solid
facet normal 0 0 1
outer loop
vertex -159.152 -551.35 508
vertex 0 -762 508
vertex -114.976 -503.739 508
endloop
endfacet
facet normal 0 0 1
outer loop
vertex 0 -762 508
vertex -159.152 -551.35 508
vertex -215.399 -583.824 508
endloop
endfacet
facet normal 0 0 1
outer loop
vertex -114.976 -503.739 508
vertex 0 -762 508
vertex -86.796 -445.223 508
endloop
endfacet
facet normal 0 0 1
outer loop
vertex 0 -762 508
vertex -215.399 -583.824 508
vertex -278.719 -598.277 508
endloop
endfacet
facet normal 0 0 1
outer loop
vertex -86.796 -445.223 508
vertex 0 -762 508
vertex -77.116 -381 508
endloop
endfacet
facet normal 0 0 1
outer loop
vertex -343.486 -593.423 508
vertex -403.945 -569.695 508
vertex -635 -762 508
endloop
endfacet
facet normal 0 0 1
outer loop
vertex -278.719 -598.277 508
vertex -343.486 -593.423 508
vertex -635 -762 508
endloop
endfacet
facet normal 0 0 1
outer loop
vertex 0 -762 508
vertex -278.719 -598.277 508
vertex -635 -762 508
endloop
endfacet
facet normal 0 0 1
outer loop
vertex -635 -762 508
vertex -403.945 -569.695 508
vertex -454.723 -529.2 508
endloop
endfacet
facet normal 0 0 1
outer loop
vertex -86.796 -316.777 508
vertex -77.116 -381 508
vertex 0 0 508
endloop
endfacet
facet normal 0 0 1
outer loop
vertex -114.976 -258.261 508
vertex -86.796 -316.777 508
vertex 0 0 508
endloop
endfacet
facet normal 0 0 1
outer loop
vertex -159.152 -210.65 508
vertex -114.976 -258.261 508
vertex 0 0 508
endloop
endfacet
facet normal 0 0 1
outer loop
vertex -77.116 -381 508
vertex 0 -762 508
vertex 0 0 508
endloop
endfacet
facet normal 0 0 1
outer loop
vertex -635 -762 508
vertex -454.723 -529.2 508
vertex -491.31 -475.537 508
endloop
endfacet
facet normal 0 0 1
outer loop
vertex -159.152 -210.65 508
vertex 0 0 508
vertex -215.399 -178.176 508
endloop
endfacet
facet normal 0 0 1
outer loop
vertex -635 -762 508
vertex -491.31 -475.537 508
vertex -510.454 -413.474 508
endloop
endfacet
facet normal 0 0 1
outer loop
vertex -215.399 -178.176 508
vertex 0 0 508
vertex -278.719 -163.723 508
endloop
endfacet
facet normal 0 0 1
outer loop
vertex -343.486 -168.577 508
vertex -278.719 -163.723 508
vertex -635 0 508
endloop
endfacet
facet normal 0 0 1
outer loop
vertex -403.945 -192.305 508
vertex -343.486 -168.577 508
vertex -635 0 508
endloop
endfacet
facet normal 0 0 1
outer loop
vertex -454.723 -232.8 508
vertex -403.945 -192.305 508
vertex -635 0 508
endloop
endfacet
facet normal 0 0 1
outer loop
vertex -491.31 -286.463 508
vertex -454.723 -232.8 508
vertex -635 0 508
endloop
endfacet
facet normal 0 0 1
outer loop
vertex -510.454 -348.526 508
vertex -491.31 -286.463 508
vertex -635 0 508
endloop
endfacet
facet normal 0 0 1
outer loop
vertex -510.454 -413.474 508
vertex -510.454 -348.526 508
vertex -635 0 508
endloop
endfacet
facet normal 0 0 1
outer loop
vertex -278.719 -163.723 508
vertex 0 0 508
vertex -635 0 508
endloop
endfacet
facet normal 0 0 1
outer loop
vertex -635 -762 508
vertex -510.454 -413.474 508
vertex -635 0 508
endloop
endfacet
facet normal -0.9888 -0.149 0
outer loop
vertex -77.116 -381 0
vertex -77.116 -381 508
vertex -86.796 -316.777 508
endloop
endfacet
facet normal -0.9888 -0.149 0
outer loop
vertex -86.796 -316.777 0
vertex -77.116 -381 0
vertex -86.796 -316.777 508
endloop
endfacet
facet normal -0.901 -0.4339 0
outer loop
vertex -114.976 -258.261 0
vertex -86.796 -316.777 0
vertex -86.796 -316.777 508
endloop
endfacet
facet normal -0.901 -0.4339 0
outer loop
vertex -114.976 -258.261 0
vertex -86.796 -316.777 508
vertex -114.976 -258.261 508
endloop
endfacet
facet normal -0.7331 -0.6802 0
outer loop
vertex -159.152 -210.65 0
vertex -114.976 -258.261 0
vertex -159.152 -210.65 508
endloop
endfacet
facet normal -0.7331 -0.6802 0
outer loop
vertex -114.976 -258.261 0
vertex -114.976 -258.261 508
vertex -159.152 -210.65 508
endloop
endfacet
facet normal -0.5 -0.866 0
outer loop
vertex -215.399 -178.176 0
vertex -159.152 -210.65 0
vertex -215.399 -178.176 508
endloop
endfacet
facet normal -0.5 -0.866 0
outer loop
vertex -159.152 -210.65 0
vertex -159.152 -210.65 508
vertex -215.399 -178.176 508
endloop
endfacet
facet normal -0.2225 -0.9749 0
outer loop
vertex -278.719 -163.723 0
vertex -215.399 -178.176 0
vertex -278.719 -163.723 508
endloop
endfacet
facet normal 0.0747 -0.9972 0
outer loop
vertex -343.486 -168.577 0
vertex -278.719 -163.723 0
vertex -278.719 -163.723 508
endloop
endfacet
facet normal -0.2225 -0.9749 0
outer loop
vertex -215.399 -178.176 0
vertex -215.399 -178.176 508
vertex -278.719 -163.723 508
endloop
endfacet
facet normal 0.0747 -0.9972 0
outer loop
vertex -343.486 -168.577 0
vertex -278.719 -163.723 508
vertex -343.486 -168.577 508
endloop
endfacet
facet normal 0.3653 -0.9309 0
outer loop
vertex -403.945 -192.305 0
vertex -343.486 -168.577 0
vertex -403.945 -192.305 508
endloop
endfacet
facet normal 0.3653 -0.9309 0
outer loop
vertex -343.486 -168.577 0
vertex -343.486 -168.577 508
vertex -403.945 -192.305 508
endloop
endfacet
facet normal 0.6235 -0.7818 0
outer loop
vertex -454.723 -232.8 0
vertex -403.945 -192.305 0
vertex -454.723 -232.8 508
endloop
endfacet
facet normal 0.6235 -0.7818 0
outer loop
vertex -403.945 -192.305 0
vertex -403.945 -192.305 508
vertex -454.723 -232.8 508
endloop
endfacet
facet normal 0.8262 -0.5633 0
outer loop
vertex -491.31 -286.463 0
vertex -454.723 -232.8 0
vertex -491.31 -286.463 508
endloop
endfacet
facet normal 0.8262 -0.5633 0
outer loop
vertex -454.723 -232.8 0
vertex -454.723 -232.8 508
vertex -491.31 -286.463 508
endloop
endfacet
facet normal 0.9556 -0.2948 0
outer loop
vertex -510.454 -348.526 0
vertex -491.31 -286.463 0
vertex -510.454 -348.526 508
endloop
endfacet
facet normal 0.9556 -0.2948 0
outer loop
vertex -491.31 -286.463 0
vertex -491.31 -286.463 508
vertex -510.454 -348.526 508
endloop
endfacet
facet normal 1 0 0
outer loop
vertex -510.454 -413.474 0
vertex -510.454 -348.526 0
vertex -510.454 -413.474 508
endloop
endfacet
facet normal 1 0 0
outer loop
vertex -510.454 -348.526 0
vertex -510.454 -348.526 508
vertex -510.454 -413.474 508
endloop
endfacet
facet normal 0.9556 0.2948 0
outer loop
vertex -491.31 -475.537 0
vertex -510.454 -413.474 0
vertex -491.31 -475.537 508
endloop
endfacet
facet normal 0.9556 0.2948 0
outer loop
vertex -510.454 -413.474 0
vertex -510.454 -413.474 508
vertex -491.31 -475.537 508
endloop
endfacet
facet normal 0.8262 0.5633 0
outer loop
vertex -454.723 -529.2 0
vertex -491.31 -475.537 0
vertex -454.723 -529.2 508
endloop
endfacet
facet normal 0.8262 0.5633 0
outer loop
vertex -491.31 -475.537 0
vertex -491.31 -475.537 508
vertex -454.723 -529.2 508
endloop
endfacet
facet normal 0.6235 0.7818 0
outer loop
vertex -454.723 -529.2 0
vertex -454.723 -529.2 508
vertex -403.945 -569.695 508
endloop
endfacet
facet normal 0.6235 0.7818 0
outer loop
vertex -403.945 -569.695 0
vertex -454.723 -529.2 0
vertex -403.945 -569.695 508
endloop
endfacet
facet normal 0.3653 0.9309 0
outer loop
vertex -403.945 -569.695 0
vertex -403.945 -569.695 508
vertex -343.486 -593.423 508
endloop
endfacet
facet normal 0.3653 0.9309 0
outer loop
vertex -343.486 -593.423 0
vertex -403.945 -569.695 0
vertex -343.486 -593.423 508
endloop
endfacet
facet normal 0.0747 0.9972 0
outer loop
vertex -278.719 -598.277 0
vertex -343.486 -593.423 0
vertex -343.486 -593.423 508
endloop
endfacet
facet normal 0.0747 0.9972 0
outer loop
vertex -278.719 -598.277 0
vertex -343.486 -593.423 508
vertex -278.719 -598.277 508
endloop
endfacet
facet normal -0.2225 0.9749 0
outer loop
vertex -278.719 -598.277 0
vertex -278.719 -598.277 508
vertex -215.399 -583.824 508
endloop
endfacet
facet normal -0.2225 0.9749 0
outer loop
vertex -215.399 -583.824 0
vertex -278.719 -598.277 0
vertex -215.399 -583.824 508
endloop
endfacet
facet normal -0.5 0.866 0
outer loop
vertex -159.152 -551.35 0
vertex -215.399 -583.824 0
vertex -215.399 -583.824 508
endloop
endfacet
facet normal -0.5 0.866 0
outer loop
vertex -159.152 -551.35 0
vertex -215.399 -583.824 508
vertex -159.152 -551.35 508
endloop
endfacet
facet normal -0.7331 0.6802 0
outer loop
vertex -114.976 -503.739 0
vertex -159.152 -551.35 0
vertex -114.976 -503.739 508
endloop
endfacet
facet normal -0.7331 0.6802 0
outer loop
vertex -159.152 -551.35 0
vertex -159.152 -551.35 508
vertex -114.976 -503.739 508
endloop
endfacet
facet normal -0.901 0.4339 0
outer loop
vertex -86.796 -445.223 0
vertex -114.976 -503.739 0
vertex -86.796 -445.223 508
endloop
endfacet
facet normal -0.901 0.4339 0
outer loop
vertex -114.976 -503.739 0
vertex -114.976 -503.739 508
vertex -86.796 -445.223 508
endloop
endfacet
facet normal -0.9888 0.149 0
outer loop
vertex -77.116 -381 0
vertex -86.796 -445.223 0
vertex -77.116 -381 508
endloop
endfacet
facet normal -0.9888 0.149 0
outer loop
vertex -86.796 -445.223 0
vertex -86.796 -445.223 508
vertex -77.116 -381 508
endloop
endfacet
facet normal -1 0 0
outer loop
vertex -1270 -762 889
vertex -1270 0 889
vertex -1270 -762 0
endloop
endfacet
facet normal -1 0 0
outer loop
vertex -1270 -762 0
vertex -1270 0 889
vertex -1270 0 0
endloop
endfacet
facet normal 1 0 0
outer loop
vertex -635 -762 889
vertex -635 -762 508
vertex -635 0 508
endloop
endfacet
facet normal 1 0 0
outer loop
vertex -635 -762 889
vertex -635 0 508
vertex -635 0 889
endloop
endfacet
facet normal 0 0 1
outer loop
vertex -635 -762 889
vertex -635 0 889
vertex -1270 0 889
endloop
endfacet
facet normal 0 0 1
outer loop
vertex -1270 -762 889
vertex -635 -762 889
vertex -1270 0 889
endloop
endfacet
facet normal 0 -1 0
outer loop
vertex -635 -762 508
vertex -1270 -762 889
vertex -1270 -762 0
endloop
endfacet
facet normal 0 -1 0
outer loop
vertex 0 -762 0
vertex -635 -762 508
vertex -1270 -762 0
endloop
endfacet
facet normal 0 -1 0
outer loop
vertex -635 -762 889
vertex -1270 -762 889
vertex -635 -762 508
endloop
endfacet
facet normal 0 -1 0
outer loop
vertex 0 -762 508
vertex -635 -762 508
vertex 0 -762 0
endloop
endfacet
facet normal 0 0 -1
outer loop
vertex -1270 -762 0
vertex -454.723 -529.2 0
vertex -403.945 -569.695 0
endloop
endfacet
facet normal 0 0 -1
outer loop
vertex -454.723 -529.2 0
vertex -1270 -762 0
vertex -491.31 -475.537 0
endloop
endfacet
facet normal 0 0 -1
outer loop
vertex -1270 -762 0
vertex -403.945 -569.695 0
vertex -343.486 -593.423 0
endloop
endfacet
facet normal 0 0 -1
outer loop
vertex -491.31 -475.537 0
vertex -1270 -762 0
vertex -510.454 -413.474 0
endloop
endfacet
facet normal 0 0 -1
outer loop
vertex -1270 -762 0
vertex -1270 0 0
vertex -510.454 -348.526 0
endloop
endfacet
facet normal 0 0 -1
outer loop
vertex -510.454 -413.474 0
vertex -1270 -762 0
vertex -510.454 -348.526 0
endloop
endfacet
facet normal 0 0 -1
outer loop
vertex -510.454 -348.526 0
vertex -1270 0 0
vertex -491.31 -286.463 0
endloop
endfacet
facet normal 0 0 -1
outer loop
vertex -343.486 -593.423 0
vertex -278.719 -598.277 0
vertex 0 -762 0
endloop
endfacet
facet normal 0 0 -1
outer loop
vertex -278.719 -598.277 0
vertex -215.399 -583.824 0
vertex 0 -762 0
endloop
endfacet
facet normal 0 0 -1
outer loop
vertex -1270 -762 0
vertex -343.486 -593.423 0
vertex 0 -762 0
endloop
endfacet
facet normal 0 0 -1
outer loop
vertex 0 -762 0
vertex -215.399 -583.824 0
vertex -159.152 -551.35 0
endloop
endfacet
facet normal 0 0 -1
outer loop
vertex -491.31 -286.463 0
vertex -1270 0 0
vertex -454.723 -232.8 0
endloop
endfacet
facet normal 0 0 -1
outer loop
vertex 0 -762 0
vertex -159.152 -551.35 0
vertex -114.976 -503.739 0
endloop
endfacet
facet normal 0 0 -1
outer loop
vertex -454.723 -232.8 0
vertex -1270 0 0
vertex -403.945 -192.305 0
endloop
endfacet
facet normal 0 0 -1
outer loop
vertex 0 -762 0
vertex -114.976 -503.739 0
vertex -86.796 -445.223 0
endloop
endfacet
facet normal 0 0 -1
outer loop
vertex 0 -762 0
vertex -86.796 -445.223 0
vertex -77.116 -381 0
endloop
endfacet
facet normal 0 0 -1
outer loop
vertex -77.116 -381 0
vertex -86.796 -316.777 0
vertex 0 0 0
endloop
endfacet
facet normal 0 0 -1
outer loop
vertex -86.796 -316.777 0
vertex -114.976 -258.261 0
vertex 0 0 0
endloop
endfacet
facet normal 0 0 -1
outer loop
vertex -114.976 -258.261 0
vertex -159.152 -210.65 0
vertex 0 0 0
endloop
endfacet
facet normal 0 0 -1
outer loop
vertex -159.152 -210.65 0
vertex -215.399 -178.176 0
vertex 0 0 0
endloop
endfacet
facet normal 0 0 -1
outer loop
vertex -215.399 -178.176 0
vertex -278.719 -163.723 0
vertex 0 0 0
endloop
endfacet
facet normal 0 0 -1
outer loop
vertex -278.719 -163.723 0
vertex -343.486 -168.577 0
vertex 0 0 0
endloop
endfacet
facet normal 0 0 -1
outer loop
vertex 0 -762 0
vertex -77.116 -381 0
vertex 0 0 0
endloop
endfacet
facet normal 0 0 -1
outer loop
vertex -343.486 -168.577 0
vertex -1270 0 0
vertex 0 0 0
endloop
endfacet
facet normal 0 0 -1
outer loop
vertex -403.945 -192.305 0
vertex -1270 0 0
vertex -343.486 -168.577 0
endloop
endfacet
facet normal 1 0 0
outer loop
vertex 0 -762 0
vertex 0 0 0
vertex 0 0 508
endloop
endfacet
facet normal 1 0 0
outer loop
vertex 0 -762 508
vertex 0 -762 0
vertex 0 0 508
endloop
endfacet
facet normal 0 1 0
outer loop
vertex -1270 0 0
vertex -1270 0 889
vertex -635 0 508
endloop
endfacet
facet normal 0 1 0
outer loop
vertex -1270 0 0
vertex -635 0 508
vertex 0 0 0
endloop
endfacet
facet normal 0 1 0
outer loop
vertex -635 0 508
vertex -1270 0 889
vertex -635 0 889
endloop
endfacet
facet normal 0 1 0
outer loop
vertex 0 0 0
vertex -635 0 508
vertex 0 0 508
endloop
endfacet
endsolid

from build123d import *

# Parameters (mm, degrees)
F1_DEPTH = 762
F2_R     = 217.8858008063
F3_DEPTH = 508


# Not quite as in the source:
# - a feature names something its author has since deleted; it is built from what else it names


with BuildPart() as f1:
    # F0 (on Front) → F1 (new body)
    with BuildSketch(Plane.XZ):
        Polygon((-1270, 0), (0, 0), (0, 508), (-635, 508), (-635, 889), (-1270, 889), align=None)
    extrude(amount=F1_DEPTH)

    # F2 (on face) → F3 (cut)
    with BuildSketch(Plane.XY.offset(508)):
        with Locations((-295.0017750263, -381)):
            Circle(F2_R)
    extrude(amount=-F3_DEPTH, mode=Mode.SUBTRACT)


solid = f1.part
